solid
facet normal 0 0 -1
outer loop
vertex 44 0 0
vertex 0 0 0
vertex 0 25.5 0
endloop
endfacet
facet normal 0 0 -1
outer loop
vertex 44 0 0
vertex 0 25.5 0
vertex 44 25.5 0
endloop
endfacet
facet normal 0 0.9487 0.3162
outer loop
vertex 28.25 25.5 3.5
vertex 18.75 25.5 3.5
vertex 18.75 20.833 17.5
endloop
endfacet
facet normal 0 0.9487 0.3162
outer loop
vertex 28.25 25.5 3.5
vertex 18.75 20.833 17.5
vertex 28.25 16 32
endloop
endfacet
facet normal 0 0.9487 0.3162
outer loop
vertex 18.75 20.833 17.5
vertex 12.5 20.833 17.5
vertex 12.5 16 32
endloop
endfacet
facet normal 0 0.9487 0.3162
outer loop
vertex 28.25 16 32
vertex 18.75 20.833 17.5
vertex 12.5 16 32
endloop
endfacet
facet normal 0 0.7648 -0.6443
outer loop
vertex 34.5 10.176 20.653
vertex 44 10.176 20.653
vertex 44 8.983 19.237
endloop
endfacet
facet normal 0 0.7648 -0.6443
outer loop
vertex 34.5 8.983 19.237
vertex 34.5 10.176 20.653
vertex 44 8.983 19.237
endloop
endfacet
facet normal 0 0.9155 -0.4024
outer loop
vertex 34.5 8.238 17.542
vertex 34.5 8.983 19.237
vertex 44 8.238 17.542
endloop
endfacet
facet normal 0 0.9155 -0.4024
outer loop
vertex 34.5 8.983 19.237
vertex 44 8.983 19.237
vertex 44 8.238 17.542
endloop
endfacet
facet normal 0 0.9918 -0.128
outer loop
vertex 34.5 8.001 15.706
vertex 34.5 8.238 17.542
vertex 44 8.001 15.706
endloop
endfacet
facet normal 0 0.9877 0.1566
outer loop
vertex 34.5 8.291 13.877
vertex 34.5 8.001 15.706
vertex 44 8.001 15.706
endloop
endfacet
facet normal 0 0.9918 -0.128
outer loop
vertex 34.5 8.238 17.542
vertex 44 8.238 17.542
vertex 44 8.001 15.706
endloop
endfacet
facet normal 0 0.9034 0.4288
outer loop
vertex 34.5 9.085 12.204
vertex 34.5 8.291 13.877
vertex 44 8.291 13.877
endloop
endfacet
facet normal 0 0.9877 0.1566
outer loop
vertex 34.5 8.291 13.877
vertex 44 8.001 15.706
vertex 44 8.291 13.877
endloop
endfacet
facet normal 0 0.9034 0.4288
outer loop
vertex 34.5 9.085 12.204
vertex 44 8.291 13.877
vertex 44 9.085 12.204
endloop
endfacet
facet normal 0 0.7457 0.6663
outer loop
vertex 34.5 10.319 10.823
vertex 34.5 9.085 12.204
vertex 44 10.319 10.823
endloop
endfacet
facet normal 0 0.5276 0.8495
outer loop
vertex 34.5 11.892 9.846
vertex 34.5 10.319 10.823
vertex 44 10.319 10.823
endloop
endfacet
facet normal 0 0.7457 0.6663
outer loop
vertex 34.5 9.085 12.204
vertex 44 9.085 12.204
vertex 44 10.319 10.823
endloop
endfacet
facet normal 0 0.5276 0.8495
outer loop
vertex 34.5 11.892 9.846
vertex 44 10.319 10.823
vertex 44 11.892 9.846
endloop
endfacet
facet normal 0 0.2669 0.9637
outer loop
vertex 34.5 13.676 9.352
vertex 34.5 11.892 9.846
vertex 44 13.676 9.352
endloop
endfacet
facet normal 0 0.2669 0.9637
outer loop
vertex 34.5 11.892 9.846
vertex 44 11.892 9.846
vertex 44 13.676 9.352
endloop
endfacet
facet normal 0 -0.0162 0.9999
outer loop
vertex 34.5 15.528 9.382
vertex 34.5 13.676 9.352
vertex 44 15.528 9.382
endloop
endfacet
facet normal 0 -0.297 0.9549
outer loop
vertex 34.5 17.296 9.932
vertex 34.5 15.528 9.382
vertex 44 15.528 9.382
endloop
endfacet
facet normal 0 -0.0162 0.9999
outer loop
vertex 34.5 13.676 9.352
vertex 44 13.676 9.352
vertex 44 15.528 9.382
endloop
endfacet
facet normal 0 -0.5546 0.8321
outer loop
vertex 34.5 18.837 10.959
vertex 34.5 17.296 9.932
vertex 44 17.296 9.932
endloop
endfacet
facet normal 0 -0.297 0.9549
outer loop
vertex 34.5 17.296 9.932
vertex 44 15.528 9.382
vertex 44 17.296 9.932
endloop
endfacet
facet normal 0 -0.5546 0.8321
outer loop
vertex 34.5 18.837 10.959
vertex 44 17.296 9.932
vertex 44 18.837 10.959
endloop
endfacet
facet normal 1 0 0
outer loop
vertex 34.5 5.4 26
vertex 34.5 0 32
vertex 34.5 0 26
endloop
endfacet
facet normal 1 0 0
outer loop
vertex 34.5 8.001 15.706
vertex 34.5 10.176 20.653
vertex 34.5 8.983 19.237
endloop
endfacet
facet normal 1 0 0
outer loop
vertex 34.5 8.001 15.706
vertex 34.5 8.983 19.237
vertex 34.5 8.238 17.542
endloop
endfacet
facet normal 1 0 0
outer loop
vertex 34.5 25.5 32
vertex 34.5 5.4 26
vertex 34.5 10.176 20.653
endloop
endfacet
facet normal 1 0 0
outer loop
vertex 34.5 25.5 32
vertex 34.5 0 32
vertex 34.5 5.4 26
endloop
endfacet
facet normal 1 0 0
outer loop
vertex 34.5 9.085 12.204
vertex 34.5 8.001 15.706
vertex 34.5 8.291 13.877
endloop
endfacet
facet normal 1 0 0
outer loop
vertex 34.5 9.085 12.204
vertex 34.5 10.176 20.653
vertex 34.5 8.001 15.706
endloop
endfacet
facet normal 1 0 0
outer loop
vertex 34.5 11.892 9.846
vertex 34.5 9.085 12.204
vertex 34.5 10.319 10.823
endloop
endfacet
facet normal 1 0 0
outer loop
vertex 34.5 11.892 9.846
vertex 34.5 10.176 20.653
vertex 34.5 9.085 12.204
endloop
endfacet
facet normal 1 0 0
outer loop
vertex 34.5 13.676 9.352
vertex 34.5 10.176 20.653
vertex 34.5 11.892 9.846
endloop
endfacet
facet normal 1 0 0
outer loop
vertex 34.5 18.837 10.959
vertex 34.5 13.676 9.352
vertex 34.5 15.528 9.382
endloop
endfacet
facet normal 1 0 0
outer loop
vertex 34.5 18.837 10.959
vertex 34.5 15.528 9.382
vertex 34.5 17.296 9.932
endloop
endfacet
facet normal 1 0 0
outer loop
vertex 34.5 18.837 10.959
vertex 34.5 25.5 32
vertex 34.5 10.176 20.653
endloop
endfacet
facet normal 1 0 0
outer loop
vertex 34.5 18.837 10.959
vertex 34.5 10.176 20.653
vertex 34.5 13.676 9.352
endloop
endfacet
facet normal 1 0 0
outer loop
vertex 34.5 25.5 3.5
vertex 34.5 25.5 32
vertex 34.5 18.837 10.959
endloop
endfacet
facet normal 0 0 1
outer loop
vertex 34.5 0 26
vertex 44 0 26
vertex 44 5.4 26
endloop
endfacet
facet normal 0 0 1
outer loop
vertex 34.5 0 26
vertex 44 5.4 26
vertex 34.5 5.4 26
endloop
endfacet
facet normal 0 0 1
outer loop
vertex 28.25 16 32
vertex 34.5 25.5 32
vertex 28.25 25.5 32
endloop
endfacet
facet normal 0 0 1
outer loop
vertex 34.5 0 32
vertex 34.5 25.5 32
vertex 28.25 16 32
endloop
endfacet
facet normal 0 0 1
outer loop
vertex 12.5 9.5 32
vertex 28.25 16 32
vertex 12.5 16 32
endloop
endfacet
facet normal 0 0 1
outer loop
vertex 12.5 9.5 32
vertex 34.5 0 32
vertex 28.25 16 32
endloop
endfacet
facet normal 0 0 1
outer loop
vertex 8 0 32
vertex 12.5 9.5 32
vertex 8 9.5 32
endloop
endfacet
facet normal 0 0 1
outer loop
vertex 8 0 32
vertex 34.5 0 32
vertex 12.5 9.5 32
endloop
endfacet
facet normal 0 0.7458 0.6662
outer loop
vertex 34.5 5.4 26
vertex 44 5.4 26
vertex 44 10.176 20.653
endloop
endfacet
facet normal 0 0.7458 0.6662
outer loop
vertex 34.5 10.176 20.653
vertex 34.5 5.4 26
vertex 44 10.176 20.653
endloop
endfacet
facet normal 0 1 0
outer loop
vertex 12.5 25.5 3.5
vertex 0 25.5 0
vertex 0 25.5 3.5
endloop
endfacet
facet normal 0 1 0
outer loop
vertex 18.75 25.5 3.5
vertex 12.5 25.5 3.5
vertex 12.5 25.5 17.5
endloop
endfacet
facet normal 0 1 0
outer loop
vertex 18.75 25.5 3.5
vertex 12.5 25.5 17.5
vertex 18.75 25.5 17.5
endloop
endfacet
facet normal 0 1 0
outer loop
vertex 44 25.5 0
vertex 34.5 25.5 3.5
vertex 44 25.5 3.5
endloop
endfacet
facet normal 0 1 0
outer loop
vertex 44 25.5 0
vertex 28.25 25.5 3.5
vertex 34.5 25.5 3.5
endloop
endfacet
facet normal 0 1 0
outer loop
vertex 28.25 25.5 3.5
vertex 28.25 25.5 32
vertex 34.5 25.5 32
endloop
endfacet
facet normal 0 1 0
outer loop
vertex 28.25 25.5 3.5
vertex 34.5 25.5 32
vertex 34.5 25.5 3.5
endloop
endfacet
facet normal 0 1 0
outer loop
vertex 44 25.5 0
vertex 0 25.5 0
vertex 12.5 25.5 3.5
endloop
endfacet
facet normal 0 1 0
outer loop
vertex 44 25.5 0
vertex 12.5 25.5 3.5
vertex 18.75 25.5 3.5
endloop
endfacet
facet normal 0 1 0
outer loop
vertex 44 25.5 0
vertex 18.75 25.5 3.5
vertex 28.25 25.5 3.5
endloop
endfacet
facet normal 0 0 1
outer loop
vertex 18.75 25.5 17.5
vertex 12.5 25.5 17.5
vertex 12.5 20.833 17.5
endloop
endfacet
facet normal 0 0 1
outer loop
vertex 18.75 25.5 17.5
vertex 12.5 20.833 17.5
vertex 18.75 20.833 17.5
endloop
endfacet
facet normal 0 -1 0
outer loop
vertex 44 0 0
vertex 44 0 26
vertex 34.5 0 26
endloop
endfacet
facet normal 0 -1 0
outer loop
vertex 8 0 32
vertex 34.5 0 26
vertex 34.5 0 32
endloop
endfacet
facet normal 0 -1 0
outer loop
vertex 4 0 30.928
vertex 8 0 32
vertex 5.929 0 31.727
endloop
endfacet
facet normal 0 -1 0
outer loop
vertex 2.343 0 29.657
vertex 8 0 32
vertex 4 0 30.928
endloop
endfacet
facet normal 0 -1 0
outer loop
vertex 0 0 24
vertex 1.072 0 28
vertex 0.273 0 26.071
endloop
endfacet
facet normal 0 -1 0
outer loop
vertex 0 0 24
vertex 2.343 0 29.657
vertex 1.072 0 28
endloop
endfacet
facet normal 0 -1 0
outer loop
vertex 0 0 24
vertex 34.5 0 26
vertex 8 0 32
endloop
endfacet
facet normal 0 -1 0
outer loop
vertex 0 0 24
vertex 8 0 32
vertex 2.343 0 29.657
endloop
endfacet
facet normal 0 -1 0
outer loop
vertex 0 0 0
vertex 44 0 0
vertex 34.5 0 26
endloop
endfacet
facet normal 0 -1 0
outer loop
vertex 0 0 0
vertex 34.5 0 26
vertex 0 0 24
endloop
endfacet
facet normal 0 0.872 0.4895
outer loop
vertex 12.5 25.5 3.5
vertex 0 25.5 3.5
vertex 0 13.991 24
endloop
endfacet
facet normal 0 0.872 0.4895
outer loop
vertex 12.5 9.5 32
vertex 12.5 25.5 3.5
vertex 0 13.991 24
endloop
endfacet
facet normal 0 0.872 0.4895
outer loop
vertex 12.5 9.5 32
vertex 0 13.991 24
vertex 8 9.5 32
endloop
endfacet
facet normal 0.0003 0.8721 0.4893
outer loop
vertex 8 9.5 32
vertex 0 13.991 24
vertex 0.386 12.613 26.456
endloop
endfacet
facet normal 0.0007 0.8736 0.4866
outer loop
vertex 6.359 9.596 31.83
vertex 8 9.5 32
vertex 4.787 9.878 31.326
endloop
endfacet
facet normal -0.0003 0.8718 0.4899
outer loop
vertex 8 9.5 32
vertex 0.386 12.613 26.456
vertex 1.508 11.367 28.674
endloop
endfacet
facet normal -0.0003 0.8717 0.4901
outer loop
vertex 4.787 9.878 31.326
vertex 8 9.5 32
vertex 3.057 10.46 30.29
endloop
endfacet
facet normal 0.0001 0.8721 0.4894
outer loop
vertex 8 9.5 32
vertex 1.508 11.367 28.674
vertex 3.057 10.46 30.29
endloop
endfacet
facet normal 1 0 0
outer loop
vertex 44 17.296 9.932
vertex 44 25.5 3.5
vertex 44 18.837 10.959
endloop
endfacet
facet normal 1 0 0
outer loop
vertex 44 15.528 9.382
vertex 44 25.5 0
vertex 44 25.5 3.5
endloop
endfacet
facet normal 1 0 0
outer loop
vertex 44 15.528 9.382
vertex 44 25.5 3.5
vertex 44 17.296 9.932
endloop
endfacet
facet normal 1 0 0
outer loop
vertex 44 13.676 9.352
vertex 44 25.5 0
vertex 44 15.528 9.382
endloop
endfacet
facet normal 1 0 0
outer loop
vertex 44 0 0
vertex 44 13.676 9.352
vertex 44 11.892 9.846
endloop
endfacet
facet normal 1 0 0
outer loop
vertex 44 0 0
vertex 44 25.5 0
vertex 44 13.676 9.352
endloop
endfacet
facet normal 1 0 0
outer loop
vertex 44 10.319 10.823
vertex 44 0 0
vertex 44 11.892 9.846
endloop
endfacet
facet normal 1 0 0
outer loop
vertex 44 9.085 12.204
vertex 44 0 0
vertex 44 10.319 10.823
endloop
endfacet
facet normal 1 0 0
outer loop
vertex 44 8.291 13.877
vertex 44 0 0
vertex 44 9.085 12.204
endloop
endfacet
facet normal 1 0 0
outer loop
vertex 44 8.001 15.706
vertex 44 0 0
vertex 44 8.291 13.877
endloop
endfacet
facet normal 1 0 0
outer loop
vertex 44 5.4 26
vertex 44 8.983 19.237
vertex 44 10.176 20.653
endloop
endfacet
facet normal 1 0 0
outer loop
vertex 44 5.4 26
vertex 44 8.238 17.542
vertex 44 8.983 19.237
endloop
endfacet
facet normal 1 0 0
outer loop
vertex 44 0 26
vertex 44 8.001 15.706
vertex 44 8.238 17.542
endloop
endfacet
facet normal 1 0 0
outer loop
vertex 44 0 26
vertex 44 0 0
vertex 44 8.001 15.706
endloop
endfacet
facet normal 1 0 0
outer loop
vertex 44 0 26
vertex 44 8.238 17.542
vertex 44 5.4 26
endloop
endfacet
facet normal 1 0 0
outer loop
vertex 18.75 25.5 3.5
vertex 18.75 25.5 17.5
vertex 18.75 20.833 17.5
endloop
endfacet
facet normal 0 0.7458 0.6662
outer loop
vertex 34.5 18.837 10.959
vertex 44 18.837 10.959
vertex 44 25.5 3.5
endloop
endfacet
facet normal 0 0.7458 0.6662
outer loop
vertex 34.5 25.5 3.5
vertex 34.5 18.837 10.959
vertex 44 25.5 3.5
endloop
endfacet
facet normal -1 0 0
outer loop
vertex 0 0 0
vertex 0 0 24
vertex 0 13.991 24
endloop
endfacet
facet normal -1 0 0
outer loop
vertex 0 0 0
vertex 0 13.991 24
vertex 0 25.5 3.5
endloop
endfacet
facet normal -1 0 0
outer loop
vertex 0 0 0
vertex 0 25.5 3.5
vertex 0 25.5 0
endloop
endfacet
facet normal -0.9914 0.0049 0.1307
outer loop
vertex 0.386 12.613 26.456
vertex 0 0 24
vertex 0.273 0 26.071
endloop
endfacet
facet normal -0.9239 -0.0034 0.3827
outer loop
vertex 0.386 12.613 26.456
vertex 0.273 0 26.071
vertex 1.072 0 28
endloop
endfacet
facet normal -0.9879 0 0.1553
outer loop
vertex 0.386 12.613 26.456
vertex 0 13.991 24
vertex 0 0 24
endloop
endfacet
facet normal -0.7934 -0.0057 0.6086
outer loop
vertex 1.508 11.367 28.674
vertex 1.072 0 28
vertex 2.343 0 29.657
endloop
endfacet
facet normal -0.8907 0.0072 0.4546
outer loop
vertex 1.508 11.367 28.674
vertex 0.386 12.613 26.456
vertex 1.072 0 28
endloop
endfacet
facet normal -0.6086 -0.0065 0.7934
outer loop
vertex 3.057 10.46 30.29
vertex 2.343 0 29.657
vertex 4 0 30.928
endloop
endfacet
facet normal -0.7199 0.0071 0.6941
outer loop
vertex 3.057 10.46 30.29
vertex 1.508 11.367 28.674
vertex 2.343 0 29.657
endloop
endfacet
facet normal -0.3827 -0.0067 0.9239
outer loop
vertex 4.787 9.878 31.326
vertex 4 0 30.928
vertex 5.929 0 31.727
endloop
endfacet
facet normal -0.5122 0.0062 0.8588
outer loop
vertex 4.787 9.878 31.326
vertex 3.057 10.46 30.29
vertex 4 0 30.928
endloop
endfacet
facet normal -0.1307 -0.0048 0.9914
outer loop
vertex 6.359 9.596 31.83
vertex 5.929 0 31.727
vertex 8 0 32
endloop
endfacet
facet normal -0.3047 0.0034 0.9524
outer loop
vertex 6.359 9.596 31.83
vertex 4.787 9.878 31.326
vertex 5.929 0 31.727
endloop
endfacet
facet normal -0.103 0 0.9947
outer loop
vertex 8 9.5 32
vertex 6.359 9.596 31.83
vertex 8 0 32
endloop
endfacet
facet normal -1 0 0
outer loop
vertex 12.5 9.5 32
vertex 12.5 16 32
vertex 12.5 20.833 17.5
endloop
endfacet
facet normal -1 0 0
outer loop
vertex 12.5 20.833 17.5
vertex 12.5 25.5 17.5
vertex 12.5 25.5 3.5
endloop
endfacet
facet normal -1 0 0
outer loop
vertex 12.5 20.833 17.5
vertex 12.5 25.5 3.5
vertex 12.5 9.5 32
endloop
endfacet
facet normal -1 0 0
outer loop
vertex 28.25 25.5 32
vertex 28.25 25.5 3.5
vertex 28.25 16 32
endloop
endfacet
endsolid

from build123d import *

# Parameters (mm, degrees)
BOSS_EXTRUDE1_DEPTH = 25.5
CUT_EXTRUDE1_DEPTH  = 12.5
CUT_EXTRUDE2_DEPTH  = 15.75
BOSS_EXTRUDE2_REACH = 27.5
SKETCH2_W           = 6.25
SKETCH2_H           = 14
CUT_EXTRUDE3_DEPTH  = 9.5
FILLET1_R           = 8


with BuildPart() as part:
    # Sketch1 → Boss-Extrude1 (new body)
    with BuildSketch(Plane(origin=(0, 0, 0), x_dir=(1, 0, 0), z_dir=(0, 1, 0))):
        Polygon((0, 0), (44, 0), (44, -26), (34.5, -26), (34.5, -32), (0, -32), align=None)
    extrude(amount=BOSS_EXTRUDE1_DEPTH)

    # Sketch3 → Cut-Extrude1 (cut)
    with BuildSketch(Plane.ZY):
        Polygon((32, 25.5), (3.5, 25.5), (32, 9.5), align=None)
    extrude(amount=-CUT_EXTRUDE1_DEPTH, mode=Mode.SUBTRACT)

    # Sketch4 → Cut-Extrude2 (cut)
    with BuildSketch(Plane.ZY.offset(-12.5)):
        Polygon((32, 25.5), (3.5, 25.5), (32, 16), align=None)
    extrude(amount=-CUT_EXTRUDE2_DEPTH, mode=Mode.SUBTRACT)

    # Boss-Extrude2: up to this face of the body (flat: up to its plane)
    boss_extrude2_end = Plane(part.part.faces().sort_by_distance((20.375, 20.75, 17.75))[0])
    # Sketch2 → Boss-Extrude2 (add, up to the picked face)
    with BuildSketch(Plane(origin=(0, 25.5, 0), x_dir=(1, 0, 0), z_dir=(0, 1, 0)), mode=Mode.PRIVATE) as boss_extrude2_sk1:
        with Locations((15.625, -10.5)):
            Rectangle(SKETCH2_W, SKETCH2_H)
    boss_extrude2_tool1 = split(extrude(boss_extrude2_sk1.sketch, amount=-BOSS_EXTRUDE2_REACH, mode=Mode.PRIVATE), bisect_by=boss_extrude2_end, keep=Keep.BOTH, mode=Mode.PRIVATE)
    add(boss_extrude2_tool1.solids().sort_by_distance((15.625, 25.5, 10.5))[0])

    # Sketch5 → Cut-Extrude3 (cut)
    with BuildSketch(Plane(origin=(44, 0, 0), x_dir=(0, 0, -1), z_dir=(1, 0, 0))):
        with BuildLine():
            Line((-10.958518779, 18.837056558), (-3.5, 25.5))
            Line((-3.5, 25.5), (-26, 25.5))
            Line((-26, 25.5), (-26, 5.4))
            Line((-26, 5.4), (-20.653405287, 10.176291277))
            ThreePointArc((-20.653405287, 10.176291277), (-11.469613255, 9.652552152), (-10.958518779, 18.837056558))
        make_face()
    extrude(amount=-CUT_EXTRUDE3_DEPTH, mode=Mode.SUBTRACT)

    # Fillet1
    fillet1_edges = [part.edges().sort_by_distance(p)[0] for p in [
        (0, 4.75, 32),
    ]]
    fillet(fillet1_edges, radius=FILLET1_R)


solid = part.part
